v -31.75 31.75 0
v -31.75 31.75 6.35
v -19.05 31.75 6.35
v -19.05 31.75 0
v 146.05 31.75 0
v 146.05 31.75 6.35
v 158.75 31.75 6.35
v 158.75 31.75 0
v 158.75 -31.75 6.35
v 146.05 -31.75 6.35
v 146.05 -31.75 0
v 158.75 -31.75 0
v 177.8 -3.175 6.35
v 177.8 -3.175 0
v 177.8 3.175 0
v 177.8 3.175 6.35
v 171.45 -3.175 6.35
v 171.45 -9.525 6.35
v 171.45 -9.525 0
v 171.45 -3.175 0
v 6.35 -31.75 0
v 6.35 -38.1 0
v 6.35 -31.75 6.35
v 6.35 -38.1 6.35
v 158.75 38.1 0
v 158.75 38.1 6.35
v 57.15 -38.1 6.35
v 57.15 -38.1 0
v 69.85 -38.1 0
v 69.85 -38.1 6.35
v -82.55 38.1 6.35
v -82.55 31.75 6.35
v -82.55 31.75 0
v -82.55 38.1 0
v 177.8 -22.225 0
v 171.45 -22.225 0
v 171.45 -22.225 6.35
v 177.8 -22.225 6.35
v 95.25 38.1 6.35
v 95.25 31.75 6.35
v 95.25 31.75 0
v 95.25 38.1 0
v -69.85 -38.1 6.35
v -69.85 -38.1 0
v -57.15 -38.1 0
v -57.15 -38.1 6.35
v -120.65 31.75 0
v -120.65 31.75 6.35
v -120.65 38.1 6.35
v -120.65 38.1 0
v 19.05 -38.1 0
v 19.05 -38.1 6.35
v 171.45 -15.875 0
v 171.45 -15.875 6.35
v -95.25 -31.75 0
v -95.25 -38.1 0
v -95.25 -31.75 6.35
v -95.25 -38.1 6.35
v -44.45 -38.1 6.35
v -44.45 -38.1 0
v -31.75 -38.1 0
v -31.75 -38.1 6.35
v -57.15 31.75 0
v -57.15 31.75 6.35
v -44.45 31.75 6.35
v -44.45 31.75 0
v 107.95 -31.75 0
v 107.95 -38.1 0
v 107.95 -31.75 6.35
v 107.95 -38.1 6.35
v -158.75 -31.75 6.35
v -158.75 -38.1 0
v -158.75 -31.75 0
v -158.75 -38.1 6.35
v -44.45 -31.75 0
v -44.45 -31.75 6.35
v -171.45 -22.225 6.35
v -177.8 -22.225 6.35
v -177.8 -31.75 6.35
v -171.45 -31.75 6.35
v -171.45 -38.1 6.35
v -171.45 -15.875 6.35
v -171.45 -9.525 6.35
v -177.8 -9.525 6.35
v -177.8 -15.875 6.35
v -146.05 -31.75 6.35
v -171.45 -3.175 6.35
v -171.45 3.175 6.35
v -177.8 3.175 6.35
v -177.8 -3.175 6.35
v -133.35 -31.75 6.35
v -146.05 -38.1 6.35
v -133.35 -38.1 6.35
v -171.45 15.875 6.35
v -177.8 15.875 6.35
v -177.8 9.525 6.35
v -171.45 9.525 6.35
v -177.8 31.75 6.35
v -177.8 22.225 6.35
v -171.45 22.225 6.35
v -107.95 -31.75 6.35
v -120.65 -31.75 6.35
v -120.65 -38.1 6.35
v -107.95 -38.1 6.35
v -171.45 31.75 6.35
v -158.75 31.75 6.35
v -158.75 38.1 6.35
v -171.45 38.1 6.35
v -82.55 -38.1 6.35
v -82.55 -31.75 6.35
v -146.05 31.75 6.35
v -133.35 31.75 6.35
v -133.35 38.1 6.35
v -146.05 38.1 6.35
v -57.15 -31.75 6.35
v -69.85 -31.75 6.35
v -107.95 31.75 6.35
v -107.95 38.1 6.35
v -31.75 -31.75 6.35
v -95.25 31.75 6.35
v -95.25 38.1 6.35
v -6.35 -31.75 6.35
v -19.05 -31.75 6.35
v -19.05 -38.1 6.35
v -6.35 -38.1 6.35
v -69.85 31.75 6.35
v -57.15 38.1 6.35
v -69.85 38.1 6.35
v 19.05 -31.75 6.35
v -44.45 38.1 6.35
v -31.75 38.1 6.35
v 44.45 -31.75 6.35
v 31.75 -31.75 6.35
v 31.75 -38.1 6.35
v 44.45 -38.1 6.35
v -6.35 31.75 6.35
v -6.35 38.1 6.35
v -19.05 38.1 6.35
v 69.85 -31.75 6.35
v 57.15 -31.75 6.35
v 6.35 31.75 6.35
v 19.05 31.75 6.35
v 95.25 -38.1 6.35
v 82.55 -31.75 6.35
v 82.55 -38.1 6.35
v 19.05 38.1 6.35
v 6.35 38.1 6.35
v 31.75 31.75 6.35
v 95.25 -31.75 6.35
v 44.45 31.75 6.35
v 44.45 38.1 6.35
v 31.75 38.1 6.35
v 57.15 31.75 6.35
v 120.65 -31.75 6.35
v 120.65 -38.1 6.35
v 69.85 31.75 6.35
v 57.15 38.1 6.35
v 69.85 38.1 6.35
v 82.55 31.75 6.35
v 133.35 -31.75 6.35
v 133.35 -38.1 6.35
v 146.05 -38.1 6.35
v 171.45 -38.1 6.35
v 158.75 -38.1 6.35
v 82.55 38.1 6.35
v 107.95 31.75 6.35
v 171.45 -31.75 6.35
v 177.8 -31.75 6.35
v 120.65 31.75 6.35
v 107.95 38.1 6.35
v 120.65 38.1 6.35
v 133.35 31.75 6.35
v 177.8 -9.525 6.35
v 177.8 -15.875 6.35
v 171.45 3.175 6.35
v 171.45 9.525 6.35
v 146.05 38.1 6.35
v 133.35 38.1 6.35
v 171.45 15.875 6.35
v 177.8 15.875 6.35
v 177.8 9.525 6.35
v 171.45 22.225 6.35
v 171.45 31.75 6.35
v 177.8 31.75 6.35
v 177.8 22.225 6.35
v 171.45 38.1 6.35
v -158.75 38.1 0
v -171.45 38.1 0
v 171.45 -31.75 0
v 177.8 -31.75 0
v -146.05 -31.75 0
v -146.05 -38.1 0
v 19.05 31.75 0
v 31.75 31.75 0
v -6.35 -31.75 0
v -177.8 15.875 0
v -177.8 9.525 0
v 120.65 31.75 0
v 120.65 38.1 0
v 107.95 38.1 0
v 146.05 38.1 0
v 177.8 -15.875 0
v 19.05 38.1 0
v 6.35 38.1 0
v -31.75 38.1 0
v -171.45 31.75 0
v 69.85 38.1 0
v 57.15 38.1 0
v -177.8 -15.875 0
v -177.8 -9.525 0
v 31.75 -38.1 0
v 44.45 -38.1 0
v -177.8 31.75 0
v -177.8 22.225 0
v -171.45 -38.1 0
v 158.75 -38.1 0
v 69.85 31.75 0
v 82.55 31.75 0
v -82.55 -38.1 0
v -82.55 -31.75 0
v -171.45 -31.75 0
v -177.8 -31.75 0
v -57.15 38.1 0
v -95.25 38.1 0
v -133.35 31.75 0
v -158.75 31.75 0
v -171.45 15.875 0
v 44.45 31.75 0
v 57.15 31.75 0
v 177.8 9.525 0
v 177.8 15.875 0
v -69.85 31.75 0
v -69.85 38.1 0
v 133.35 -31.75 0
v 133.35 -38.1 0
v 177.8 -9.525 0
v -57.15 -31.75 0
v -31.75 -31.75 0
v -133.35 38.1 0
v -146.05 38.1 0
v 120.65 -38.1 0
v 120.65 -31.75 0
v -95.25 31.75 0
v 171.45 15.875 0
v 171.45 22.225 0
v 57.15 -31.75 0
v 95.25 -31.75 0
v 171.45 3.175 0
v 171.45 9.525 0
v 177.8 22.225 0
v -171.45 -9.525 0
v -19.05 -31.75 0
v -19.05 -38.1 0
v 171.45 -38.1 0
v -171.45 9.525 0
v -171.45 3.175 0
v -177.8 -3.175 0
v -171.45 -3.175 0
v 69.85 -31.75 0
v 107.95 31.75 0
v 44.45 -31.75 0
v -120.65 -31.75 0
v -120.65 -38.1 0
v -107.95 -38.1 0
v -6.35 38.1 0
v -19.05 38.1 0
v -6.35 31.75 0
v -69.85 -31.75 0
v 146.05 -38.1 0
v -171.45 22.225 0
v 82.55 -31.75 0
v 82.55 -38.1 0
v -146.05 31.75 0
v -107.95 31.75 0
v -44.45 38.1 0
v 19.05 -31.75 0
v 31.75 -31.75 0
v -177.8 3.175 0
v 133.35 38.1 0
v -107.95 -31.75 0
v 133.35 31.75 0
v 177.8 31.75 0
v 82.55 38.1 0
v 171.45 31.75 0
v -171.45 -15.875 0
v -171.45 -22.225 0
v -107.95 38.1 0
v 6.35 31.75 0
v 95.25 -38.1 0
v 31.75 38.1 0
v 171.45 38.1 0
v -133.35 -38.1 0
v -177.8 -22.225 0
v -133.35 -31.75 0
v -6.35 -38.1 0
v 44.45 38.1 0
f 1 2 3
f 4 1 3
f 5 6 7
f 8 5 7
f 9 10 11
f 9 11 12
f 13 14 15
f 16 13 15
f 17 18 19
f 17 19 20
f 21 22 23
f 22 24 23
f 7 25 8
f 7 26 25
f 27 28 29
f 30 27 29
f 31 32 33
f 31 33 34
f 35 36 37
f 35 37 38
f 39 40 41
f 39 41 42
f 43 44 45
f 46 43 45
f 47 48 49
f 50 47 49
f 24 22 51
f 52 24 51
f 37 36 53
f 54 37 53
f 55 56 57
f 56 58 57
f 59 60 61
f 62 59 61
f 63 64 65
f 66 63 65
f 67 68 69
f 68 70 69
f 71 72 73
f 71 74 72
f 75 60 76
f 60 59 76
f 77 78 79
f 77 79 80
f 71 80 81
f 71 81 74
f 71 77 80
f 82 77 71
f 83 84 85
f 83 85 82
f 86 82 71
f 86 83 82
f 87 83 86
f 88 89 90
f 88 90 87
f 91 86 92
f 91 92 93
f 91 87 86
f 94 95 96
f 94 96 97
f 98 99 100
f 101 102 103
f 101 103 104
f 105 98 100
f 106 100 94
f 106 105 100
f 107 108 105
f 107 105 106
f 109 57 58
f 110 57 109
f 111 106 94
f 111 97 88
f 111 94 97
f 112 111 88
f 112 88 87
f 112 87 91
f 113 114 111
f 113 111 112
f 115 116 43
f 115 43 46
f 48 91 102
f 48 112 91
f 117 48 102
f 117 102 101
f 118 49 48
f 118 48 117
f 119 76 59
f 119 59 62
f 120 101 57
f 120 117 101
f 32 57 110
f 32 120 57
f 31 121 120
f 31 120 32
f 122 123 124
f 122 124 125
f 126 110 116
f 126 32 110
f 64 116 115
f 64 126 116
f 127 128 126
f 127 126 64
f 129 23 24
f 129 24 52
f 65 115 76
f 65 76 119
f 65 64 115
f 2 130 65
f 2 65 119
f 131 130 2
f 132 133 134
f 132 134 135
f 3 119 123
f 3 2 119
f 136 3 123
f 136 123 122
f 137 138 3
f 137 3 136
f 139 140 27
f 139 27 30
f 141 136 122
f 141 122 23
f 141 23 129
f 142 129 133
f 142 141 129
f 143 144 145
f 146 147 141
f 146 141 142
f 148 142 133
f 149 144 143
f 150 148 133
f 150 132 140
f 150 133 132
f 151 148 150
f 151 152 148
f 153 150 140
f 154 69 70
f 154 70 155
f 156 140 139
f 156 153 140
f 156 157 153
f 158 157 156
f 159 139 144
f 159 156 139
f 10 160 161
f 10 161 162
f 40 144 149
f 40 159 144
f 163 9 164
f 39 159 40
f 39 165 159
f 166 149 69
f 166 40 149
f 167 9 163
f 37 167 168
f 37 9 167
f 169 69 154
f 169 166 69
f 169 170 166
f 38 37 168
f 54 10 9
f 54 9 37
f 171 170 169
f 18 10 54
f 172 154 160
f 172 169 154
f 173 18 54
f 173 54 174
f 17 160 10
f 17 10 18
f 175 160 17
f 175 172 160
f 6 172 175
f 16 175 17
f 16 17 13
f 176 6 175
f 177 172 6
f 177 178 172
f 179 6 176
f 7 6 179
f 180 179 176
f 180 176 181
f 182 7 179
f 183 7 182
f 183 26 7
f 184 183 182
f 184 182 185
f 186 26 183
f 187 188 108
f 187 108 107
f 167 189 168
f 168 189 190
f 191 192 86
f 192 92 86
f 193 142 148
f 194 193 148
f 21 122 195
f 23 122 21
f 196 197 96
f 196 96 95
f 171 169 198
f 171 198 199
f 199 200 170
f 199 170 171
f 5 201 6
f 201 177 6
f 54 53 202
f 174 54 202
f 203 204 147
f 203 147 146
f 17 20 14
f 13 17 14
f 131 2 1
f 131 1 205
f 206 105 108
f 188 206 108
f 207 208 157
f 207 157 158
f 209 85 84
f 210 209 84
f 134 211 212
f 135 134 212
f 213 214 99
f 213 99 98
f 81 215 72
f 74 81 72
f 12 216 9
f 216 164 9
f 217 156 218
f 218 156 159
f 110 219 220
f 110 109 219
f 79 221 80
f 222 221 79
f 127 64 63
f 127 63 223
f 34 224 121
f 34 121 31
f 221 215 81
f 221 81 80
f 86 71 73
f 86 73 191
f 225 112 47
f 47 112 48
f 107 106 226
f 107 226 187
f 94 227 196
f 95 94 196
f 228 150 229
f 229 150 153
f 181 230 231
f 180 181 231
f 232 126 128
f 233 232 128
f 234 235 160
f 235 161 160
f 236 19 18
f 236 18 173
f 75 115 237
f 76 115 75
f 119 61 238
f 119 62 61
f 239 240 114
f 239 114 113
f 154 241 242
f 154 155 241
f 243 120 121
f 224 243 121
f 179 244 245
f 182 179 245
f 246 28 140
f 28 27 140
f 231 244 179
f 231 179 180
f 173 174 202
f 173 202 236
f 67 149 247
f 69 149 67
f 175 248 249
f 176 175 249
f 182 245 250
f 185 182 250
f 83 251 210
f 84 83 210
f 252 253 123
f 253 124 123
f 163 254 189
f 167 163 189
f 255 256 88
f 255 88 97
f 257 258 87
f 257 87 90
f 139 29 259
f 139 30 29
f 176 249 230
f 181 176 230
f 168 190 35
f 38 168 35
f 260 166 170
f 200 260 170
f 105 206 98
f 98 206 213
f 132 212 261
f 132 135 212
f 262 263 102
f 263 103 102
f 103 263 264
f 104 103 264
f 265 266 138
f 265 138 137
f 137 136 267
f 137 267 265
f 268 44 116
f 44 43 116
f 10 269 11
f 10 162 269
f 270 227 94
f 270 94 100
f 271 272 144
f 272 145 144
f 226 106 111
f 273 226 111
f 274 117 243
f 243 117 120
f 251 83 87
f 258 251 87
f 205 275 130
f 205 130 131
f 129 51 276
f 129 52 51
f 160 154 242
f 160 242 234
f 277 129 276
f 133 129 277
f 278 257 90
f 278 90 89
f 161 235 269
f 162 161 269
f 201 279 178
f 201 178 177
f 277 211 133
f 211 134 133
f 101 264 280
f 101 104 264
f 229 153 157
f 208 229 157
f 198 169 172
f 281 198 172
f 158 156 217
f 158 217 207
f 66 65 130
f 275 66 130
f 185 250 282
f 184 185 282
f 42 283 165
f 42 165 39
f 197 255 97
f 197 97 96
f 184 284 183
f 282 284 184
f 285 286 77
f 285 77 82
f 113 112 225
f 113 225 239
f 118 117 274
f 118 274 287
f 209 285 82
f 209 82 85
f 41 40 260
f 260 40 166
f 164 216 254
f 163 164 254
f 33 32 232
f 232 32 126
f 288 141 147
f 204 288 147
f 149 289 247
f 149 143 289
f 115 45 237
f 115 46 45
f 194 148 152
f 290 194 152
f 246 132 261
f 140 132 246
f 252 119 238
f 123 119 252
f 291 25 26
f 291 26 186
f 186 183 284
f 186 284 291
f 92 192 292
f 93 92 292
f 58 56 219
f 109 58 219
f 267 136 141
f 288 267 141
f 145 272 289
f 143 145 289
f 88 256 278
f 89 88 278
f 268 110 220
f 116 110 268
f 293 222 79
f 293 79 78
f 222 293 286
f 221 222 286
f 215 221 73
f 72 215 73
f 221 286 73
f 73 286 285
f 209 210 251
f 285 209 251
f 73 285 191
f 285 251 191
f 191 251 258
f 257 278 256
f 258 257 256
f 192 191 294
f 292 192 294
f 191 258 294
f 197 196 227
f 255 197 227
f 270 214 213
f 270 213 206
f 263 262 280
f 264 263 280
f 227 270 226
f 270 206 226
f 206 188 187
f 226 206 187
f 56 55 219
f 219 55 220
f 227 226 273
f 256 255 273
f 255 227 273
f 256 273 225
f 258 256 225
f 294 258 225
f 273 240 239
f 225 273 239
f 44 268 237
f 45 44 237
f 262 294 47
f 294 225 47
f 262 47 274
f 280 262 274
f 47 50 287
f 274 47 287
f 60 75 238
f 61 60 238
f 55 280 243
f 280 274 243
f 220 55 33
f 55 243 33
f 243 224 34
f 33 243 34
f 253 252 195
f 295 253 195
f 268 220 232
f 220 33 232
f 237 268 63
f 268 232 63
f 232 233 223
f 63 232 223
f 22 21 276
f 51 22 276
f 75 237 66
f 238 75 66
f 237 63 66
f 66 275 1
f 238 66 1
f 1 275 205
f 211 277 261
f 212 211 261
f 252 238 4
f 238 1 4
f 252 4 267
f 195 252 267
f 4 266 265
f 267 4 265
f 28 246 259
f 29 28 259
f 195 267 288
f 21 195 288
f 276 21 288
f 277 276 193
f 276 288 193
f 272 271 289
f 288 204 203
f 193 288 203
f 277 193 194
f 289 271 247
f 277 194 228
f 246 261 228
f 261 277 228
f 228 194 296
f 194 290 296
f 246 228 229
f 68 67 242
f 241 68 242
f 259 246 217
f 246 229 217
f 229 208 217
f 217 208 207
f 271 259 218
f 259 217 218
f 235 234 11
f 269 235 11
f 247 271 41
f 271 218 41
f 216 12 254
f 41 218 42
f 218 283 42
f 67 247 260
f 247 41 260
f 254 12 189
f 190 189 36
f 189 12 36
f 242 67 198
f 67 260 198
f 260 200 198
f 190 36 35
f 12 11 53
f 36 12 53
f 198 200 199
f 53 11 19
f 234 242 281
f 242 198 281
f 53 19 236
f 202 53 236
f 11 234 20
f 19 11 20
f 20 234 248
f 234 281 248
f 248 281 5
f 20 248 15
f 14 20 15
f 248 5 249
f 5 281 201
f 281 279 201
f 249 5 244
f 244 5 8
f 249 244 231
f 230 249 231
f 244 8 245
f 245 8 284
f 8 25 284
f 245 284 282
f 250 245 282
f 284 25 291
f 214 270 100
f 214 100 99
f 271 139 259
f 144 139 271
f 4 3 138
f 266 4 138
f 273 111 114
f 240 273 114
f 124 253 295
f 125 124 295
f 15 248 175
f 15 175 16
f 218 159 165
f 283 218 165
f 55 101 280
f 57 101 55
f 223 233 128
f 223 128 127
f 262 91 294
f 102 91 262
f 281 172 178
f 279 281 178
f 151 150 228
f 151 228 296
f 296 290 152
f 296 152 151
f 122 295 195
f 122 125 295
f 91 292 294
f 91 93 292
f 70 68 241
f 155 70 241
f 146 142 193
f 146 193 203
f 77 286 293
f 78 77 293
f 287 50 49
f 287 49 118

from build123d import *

# Parameters (mm, degrees)
SKETCH1_W                = 355.6
SKETCH1_H                = 76.2
BOSS_EXTRUDE1_DEPTH      = 6.35
SKETCH2_W                = 12.7
SKETCH2_H                = 25.4
CUT_EXTRUDE5_DEPTH       = 182.94716953
LPATTERN1_COUNT          = 13
LPATTERN1_PITCH          = 25.4
MIRROR1_COPY_1_SKETCH_W  = 12.7
MIRROR1_COPY_1_SKETCH_H  = 25.4
MIRROR1_COPY_1_DEPTH     = 182.94716953
MIRROR1_COPY_2_SKETCH_W  = 12.7
MIRROR1_COPY_2_SKETCH_H  = 25.4
MIRROR1_COPY_2_DEPTH     = 182.94716953
MIRROR1_COPY_3_SKETCH_W  = 12.7
MIRROR1_COPY_3_SKETCH_H  = 25.4
MIRROR1_COPY_3_DEPTH     = 182.94716953
MIRROR1_COPY_4_SKETCH_W  = 12.7
MIRROR1_COPY_4_SKETCH_H  = 25.4
MIRROR1_COPY_4_DEPTH     = 182.94716953
MIRROR1_COPY_5_SKETCH_W  = 12.7
MIRROR1_COPY_5_SKETCH_H  = 25.4
MIRROR1_COPY_5_DEPTH     = 182.94716953
MIRROR1_COPY_6_SKETCH_W  = 12.7
MIRROR1_COPY_6_SKETCH_H  = 25.4
MIRROR1_COPY_6_DEPTH     = 182.94716953
MIRROR1_COPY_7_SKETCH_W  = 12.7
MIRROR1_COPY_7_SKETCH_H  = 25.4
MIRROR1_COPY_7_DEPTH     = 182.94716953
MIRROR1_COPY_8_SKETCH_W  = 12.7
MIRROR1_COPY_8_SKETCH_H  = 25.4
MIRROR1_COPY_8_DEPTH     = 182.94716953
MIRROR1_COPY_9_SKETCH_W  = 12.7
MIRROR1_COPY_9_SKETCH_H  = 25.4
MIRROR1_COPY_9_DEPTH     = 182.94716953
MIRROR1_COPY_10_SKETCH_W = 12.7
MIRROR1_COPY_10_SKETCH_H = 25.4
MIRROR1_COPY_10_DEPTH    = 182.94716953
MIRROR1_COPY_11_SKETCH_W = 12.7
MIRROR1_COPY_11_SKETCH_H = 25.4
MIRROR1_COPY_11_DEPTH    = 182.94716953
MIRROR1_COPY_12_SKETCH_W = 12.7
MIRROR1_COPY_12_SKETCH_H = 25.4
MIRROR1_COPY_12_DEPTH    = 182.94716953
SKETCH3_W                = 40.748476415
SKETCH3_H                = 6.35
SKETCH3_W_2              = 25.4
SKETCH3_H_2              = 25.4
CUT_EXTRUDE7_DEPTH       = 182.94716953


with BuildPart() as part:
    # Sketch1 → Boss-Extrude1 (new body)
    with BuildSketch(Plane.XY):
        Rectangle(SKETCH1_W, SKETCH1_H)
    extrude(amount=BOSS_EXTRUDE1_DEPTH)

    # Sketch2 → Cut-Extrude5 (cut, symmetric)
    with BuildSketch(Plane.XY):
        with Locations((152.4, -44.45)):
            Rectangle(SKETCH2_W, SKETCH2_H)
    cut_extrude5 = extrude(amount=CUT_EXTRUDE5_DEPTH, both=True, mode=Mode.SUBTRACT)

    # LPattern1: Cut-Extrude5 ×13
    with Locations(*[(-i * LPATTERN1_PITCH, 0, 0) for i in range(1, LPATTERN1_COUNT)]):
        add(cut_extrude5, mode=Mode.SUBTRACT)

    # Mirror1: Cut-Extrude5 across plane
    add(cut_extrude5.mirror(Plane.ZX), mode=Mode.SUBTRACT)

    # Mirror1 copy 1 sketch → Mirror1 copy 1 (cut, symmetric)
    with BuildSketch(Plane(origin=(-25.4, 0, 0), x_dir=(1, 0, 0), z_dir=(0, 0, 1))):
        with Locations((152.4, 44.45)):
            Rectangle(MIRROR1_COPY_1_SKETCH_W, MIRROR1_COPY_1_SKETCH_H)
    extrude(amount=MIRROR1_COPY_1_DEPTH, both=True, mode=Mode.SUBTRACT)

    # Mirror1 copy 2 sketch → Mirror1 copy 2 (cut, symmetric)
    with BuildSketch(Plane(origin=(-50.8, 0, 0), x_dir=(1, 0, 0), z_dir=(0, 0, 1))):
        with Locations((152.4, 44.45)):
            Rectangle(MIRROR1_COPY_2_SKETCH_W, MIRROR1_COPY_2_SKETCH_H)
    extrude(amount=MIRROR1_COPY_2_DEPTH, both=True, mode=Mode.SUBTRACT)

    # Mirror1 copy 3 sketch → Mirror1 copy 3 (cut, symmetric)
    with BuildSketch(Plane(origin=(-76.2, 0, 0), x_dir=(1, 0, 0), z_dir=(0, 0, 1))):
        with Locations((152.4, 44.45)):
            Rectangle(MIRROR1_COPY_3_SKETCH_W, MIRROR1_COPY_3_SKETCH_H)
    extrude(amount=MIRROR1_COPY_3_DEPTH, both=True, mode=Mode.SUBTRACT)

    # Mirror1 copy 4 sketch → Mirror1 copy 4 (cut, symmetric)
    with BuildSketch(Plane(origin=(-101.6, 0, 0), x_dir=(1, 0, 0), z_dir=(0, 0, 1))):
        with Locations((152.4, 44.45)):
            Rectangle(MIRROR1_COPY_4_SKETCH_W, MIRROR1_COPY_4_SKETCH_H)
    extrude(amount=MIRROR1_COPY_4_DEPTH, both=True, mode=Mode.SUBTRACT)

    # Mirror1 copy 5 sketch → Mirror1 copy 5 (cut, symmetric)
    with BuildSketch(Plane(origin=(-127, 0, 0), x_dir=(1, 0, 0), z_dir=(0, 0, 1))):
        with Locations((152.4, 44.45)):
            Rectangle(MIRROR1_COPY_5_SKETCH_W, MIRROR1_COPY_5_SKETCH_H)
    extrude(amount=MIRROR1_COPY_5_DEPTH, both=True, mode=Mode.SUBTRACT)

    # Mirror1 copy 6 sketch → Mirror1 copy 6 (cut, symmetric)
    with BuildSketch(Plane(origin=(-152.4, 0, 0), x_dir=(1, 0, 0), z_dir=(0, 0, 1))):
        with Locations((152.4, 44.45)):
            Rectangle(MIRROR1_COPY_6_SKETCH_W, MIRROR1_COPY_6_SKETCH_H)
    extrude(amount=MIRROR1_COPY_6_DEPTH, both=True, mode=Mode.SUBTRACT)

    # Mirror1 copy 7 sketch → Mirror1 copy 7 (cut, symmetric)
    with BuildSketch(Plane(origin=(-177.8, 0, 0), x_dir=(1, 0, 0), z_dir=(0, 0, 1))):
        with Locations((152.4, 44.45)):
            Rectangle(MIRROR1_COPY_7_SKETCH_W, MIRROR1_COPY_7_SKETCH_H)
    extrude(amount=MIRROR1_COPY_7_DEPTH, both=True, mode=Mode.SUBTRACT)

    # Mirror1 copy 8 sketch → Mirror1 copy 8 (cut, symmetric)
    with BuildSketch(Plane(origin=(-203.2, 0, 0), x_dir=(1, 0, 0), z_dir=(0, 0, 1))):
        with Locations((152.4, 44.45)):
            Rectangle(MIRROR1_COPY_8_SKETCH_W, MIRROR1_COPY_8_SKETCH_H)
    extrude(amount=MIRROR1_COPY_8_DEPTH, both=True, mode=Mode.SUBTRACT)

    # Mirror1 copy 9 sketch → Mirror1 copy 9 (cut, symmetric)
    with BuildSketch(Plane(origin=(-228.6, 0, 0), x_dir=(1, 0, 0), z_dir=(0, 0, 1))):
        with Locations((152.4, 44.45)):
            Rectangle(MIRROR1_COPY_9_SKETCH_W, MIRROR1_COPY_9_SKETCH_H)
    extrude(amount=MIRROR1_COPY_9_DEPTH, both=True, mode=Mode.SUBTRACT)

    # Mirror1 copy 10 sketch → Mirror1 copy 10 (cut, symmetric)
    with BuildSketch(Plane(origin=(-254, 0, 0), x_dir=(1, 0, 0), z_dir=(0, 0, 1))):
        with Locations((152.4, 44.45)):
            Rectangle(MIRROR1_COPY_10_SKETCH_W, MIRROR1_COPY_10_SKETCH_H)
    extrude(amount=MIRROR1_COPY_10_DEPTH, both=True, mode=Mode.SUBTRACT)

    # Mirror1 copy 11 sketch → Mirror1 copy 11 (cut, symmetric)
    with BuildSketch(Plane(origin=(-279.4, 0, 0), x_dir=(1, 0, 0), z_dir=(0, 0, 1))):
        with Locations((152.4, 44.45)):
            Rectangle(MIRROR1_COPY_11_SKETCH_W, MIRROR1_COPY_11_SKETCH_H)
    extrude(amount=MIRROR1_COPY_11_DEPTH, both=True, mode=Mode.SUBTRACT)

    # Mirror1 copy 12 sketch → Mirror1 copy 12 (cut, symmetric)
    with BuildSketch(Plane(origin=(-304.8, 0, 0), x_dir=(1, 0, 0), z_dir=(0, 0, 1))):
        with Locations((152.4, 44.45)):
            Rectangle(MIRROR1_COPY_12_SKETCH_W, MIRROR1_COPY_12_SKETCH_H)
    extrude(amount=MIRROR1_COPY_12_DEPTH, both=True, mode=Mode.SUBTRACT)

    # Sketch3 → Cut-Extrude7 (cut, through all)
    with BuildSketch(Plane.XY):
        with Locations((191.824238208, 19.05)):
            Rectangle(SKETCH3_W, SKETCH3_H)
        with Locations((191.824238208, 6.35)):
            Rectangle(SKETCH3_W, SKETCH3_H)
        with Locations((191.824238208, -6.35)):
            Rectangle(SKETCH3_W, SKETCH3_H)
        with Locations((191.824238208, -19.05)):
            Rectangle(SKETCH3_W, SKETCH3_H)
        with Locations((184.15, 44.45)):
            Rectangle(SKETCH3_W_2, SKETCH3_H_2)
        with Locations((184.15, -44.45)):
            Rectangle(SKETCH3_W_2, SKETCH3_H_2)
    cut_extrude7 = extrude(amount=CUT_EXTRUDE7_DEPTH, mode=Mode.SUBTRACT)

    # Mirror2: Cut-Extrude7 across plane
    add(cut_extrude7.mirror(Plane(origin=(0, 0, 0), x_dir=(0, 0, 1), z_dir=(1, 0, 0))), mode=Mode.SUBTRACT)


solid = part.part
